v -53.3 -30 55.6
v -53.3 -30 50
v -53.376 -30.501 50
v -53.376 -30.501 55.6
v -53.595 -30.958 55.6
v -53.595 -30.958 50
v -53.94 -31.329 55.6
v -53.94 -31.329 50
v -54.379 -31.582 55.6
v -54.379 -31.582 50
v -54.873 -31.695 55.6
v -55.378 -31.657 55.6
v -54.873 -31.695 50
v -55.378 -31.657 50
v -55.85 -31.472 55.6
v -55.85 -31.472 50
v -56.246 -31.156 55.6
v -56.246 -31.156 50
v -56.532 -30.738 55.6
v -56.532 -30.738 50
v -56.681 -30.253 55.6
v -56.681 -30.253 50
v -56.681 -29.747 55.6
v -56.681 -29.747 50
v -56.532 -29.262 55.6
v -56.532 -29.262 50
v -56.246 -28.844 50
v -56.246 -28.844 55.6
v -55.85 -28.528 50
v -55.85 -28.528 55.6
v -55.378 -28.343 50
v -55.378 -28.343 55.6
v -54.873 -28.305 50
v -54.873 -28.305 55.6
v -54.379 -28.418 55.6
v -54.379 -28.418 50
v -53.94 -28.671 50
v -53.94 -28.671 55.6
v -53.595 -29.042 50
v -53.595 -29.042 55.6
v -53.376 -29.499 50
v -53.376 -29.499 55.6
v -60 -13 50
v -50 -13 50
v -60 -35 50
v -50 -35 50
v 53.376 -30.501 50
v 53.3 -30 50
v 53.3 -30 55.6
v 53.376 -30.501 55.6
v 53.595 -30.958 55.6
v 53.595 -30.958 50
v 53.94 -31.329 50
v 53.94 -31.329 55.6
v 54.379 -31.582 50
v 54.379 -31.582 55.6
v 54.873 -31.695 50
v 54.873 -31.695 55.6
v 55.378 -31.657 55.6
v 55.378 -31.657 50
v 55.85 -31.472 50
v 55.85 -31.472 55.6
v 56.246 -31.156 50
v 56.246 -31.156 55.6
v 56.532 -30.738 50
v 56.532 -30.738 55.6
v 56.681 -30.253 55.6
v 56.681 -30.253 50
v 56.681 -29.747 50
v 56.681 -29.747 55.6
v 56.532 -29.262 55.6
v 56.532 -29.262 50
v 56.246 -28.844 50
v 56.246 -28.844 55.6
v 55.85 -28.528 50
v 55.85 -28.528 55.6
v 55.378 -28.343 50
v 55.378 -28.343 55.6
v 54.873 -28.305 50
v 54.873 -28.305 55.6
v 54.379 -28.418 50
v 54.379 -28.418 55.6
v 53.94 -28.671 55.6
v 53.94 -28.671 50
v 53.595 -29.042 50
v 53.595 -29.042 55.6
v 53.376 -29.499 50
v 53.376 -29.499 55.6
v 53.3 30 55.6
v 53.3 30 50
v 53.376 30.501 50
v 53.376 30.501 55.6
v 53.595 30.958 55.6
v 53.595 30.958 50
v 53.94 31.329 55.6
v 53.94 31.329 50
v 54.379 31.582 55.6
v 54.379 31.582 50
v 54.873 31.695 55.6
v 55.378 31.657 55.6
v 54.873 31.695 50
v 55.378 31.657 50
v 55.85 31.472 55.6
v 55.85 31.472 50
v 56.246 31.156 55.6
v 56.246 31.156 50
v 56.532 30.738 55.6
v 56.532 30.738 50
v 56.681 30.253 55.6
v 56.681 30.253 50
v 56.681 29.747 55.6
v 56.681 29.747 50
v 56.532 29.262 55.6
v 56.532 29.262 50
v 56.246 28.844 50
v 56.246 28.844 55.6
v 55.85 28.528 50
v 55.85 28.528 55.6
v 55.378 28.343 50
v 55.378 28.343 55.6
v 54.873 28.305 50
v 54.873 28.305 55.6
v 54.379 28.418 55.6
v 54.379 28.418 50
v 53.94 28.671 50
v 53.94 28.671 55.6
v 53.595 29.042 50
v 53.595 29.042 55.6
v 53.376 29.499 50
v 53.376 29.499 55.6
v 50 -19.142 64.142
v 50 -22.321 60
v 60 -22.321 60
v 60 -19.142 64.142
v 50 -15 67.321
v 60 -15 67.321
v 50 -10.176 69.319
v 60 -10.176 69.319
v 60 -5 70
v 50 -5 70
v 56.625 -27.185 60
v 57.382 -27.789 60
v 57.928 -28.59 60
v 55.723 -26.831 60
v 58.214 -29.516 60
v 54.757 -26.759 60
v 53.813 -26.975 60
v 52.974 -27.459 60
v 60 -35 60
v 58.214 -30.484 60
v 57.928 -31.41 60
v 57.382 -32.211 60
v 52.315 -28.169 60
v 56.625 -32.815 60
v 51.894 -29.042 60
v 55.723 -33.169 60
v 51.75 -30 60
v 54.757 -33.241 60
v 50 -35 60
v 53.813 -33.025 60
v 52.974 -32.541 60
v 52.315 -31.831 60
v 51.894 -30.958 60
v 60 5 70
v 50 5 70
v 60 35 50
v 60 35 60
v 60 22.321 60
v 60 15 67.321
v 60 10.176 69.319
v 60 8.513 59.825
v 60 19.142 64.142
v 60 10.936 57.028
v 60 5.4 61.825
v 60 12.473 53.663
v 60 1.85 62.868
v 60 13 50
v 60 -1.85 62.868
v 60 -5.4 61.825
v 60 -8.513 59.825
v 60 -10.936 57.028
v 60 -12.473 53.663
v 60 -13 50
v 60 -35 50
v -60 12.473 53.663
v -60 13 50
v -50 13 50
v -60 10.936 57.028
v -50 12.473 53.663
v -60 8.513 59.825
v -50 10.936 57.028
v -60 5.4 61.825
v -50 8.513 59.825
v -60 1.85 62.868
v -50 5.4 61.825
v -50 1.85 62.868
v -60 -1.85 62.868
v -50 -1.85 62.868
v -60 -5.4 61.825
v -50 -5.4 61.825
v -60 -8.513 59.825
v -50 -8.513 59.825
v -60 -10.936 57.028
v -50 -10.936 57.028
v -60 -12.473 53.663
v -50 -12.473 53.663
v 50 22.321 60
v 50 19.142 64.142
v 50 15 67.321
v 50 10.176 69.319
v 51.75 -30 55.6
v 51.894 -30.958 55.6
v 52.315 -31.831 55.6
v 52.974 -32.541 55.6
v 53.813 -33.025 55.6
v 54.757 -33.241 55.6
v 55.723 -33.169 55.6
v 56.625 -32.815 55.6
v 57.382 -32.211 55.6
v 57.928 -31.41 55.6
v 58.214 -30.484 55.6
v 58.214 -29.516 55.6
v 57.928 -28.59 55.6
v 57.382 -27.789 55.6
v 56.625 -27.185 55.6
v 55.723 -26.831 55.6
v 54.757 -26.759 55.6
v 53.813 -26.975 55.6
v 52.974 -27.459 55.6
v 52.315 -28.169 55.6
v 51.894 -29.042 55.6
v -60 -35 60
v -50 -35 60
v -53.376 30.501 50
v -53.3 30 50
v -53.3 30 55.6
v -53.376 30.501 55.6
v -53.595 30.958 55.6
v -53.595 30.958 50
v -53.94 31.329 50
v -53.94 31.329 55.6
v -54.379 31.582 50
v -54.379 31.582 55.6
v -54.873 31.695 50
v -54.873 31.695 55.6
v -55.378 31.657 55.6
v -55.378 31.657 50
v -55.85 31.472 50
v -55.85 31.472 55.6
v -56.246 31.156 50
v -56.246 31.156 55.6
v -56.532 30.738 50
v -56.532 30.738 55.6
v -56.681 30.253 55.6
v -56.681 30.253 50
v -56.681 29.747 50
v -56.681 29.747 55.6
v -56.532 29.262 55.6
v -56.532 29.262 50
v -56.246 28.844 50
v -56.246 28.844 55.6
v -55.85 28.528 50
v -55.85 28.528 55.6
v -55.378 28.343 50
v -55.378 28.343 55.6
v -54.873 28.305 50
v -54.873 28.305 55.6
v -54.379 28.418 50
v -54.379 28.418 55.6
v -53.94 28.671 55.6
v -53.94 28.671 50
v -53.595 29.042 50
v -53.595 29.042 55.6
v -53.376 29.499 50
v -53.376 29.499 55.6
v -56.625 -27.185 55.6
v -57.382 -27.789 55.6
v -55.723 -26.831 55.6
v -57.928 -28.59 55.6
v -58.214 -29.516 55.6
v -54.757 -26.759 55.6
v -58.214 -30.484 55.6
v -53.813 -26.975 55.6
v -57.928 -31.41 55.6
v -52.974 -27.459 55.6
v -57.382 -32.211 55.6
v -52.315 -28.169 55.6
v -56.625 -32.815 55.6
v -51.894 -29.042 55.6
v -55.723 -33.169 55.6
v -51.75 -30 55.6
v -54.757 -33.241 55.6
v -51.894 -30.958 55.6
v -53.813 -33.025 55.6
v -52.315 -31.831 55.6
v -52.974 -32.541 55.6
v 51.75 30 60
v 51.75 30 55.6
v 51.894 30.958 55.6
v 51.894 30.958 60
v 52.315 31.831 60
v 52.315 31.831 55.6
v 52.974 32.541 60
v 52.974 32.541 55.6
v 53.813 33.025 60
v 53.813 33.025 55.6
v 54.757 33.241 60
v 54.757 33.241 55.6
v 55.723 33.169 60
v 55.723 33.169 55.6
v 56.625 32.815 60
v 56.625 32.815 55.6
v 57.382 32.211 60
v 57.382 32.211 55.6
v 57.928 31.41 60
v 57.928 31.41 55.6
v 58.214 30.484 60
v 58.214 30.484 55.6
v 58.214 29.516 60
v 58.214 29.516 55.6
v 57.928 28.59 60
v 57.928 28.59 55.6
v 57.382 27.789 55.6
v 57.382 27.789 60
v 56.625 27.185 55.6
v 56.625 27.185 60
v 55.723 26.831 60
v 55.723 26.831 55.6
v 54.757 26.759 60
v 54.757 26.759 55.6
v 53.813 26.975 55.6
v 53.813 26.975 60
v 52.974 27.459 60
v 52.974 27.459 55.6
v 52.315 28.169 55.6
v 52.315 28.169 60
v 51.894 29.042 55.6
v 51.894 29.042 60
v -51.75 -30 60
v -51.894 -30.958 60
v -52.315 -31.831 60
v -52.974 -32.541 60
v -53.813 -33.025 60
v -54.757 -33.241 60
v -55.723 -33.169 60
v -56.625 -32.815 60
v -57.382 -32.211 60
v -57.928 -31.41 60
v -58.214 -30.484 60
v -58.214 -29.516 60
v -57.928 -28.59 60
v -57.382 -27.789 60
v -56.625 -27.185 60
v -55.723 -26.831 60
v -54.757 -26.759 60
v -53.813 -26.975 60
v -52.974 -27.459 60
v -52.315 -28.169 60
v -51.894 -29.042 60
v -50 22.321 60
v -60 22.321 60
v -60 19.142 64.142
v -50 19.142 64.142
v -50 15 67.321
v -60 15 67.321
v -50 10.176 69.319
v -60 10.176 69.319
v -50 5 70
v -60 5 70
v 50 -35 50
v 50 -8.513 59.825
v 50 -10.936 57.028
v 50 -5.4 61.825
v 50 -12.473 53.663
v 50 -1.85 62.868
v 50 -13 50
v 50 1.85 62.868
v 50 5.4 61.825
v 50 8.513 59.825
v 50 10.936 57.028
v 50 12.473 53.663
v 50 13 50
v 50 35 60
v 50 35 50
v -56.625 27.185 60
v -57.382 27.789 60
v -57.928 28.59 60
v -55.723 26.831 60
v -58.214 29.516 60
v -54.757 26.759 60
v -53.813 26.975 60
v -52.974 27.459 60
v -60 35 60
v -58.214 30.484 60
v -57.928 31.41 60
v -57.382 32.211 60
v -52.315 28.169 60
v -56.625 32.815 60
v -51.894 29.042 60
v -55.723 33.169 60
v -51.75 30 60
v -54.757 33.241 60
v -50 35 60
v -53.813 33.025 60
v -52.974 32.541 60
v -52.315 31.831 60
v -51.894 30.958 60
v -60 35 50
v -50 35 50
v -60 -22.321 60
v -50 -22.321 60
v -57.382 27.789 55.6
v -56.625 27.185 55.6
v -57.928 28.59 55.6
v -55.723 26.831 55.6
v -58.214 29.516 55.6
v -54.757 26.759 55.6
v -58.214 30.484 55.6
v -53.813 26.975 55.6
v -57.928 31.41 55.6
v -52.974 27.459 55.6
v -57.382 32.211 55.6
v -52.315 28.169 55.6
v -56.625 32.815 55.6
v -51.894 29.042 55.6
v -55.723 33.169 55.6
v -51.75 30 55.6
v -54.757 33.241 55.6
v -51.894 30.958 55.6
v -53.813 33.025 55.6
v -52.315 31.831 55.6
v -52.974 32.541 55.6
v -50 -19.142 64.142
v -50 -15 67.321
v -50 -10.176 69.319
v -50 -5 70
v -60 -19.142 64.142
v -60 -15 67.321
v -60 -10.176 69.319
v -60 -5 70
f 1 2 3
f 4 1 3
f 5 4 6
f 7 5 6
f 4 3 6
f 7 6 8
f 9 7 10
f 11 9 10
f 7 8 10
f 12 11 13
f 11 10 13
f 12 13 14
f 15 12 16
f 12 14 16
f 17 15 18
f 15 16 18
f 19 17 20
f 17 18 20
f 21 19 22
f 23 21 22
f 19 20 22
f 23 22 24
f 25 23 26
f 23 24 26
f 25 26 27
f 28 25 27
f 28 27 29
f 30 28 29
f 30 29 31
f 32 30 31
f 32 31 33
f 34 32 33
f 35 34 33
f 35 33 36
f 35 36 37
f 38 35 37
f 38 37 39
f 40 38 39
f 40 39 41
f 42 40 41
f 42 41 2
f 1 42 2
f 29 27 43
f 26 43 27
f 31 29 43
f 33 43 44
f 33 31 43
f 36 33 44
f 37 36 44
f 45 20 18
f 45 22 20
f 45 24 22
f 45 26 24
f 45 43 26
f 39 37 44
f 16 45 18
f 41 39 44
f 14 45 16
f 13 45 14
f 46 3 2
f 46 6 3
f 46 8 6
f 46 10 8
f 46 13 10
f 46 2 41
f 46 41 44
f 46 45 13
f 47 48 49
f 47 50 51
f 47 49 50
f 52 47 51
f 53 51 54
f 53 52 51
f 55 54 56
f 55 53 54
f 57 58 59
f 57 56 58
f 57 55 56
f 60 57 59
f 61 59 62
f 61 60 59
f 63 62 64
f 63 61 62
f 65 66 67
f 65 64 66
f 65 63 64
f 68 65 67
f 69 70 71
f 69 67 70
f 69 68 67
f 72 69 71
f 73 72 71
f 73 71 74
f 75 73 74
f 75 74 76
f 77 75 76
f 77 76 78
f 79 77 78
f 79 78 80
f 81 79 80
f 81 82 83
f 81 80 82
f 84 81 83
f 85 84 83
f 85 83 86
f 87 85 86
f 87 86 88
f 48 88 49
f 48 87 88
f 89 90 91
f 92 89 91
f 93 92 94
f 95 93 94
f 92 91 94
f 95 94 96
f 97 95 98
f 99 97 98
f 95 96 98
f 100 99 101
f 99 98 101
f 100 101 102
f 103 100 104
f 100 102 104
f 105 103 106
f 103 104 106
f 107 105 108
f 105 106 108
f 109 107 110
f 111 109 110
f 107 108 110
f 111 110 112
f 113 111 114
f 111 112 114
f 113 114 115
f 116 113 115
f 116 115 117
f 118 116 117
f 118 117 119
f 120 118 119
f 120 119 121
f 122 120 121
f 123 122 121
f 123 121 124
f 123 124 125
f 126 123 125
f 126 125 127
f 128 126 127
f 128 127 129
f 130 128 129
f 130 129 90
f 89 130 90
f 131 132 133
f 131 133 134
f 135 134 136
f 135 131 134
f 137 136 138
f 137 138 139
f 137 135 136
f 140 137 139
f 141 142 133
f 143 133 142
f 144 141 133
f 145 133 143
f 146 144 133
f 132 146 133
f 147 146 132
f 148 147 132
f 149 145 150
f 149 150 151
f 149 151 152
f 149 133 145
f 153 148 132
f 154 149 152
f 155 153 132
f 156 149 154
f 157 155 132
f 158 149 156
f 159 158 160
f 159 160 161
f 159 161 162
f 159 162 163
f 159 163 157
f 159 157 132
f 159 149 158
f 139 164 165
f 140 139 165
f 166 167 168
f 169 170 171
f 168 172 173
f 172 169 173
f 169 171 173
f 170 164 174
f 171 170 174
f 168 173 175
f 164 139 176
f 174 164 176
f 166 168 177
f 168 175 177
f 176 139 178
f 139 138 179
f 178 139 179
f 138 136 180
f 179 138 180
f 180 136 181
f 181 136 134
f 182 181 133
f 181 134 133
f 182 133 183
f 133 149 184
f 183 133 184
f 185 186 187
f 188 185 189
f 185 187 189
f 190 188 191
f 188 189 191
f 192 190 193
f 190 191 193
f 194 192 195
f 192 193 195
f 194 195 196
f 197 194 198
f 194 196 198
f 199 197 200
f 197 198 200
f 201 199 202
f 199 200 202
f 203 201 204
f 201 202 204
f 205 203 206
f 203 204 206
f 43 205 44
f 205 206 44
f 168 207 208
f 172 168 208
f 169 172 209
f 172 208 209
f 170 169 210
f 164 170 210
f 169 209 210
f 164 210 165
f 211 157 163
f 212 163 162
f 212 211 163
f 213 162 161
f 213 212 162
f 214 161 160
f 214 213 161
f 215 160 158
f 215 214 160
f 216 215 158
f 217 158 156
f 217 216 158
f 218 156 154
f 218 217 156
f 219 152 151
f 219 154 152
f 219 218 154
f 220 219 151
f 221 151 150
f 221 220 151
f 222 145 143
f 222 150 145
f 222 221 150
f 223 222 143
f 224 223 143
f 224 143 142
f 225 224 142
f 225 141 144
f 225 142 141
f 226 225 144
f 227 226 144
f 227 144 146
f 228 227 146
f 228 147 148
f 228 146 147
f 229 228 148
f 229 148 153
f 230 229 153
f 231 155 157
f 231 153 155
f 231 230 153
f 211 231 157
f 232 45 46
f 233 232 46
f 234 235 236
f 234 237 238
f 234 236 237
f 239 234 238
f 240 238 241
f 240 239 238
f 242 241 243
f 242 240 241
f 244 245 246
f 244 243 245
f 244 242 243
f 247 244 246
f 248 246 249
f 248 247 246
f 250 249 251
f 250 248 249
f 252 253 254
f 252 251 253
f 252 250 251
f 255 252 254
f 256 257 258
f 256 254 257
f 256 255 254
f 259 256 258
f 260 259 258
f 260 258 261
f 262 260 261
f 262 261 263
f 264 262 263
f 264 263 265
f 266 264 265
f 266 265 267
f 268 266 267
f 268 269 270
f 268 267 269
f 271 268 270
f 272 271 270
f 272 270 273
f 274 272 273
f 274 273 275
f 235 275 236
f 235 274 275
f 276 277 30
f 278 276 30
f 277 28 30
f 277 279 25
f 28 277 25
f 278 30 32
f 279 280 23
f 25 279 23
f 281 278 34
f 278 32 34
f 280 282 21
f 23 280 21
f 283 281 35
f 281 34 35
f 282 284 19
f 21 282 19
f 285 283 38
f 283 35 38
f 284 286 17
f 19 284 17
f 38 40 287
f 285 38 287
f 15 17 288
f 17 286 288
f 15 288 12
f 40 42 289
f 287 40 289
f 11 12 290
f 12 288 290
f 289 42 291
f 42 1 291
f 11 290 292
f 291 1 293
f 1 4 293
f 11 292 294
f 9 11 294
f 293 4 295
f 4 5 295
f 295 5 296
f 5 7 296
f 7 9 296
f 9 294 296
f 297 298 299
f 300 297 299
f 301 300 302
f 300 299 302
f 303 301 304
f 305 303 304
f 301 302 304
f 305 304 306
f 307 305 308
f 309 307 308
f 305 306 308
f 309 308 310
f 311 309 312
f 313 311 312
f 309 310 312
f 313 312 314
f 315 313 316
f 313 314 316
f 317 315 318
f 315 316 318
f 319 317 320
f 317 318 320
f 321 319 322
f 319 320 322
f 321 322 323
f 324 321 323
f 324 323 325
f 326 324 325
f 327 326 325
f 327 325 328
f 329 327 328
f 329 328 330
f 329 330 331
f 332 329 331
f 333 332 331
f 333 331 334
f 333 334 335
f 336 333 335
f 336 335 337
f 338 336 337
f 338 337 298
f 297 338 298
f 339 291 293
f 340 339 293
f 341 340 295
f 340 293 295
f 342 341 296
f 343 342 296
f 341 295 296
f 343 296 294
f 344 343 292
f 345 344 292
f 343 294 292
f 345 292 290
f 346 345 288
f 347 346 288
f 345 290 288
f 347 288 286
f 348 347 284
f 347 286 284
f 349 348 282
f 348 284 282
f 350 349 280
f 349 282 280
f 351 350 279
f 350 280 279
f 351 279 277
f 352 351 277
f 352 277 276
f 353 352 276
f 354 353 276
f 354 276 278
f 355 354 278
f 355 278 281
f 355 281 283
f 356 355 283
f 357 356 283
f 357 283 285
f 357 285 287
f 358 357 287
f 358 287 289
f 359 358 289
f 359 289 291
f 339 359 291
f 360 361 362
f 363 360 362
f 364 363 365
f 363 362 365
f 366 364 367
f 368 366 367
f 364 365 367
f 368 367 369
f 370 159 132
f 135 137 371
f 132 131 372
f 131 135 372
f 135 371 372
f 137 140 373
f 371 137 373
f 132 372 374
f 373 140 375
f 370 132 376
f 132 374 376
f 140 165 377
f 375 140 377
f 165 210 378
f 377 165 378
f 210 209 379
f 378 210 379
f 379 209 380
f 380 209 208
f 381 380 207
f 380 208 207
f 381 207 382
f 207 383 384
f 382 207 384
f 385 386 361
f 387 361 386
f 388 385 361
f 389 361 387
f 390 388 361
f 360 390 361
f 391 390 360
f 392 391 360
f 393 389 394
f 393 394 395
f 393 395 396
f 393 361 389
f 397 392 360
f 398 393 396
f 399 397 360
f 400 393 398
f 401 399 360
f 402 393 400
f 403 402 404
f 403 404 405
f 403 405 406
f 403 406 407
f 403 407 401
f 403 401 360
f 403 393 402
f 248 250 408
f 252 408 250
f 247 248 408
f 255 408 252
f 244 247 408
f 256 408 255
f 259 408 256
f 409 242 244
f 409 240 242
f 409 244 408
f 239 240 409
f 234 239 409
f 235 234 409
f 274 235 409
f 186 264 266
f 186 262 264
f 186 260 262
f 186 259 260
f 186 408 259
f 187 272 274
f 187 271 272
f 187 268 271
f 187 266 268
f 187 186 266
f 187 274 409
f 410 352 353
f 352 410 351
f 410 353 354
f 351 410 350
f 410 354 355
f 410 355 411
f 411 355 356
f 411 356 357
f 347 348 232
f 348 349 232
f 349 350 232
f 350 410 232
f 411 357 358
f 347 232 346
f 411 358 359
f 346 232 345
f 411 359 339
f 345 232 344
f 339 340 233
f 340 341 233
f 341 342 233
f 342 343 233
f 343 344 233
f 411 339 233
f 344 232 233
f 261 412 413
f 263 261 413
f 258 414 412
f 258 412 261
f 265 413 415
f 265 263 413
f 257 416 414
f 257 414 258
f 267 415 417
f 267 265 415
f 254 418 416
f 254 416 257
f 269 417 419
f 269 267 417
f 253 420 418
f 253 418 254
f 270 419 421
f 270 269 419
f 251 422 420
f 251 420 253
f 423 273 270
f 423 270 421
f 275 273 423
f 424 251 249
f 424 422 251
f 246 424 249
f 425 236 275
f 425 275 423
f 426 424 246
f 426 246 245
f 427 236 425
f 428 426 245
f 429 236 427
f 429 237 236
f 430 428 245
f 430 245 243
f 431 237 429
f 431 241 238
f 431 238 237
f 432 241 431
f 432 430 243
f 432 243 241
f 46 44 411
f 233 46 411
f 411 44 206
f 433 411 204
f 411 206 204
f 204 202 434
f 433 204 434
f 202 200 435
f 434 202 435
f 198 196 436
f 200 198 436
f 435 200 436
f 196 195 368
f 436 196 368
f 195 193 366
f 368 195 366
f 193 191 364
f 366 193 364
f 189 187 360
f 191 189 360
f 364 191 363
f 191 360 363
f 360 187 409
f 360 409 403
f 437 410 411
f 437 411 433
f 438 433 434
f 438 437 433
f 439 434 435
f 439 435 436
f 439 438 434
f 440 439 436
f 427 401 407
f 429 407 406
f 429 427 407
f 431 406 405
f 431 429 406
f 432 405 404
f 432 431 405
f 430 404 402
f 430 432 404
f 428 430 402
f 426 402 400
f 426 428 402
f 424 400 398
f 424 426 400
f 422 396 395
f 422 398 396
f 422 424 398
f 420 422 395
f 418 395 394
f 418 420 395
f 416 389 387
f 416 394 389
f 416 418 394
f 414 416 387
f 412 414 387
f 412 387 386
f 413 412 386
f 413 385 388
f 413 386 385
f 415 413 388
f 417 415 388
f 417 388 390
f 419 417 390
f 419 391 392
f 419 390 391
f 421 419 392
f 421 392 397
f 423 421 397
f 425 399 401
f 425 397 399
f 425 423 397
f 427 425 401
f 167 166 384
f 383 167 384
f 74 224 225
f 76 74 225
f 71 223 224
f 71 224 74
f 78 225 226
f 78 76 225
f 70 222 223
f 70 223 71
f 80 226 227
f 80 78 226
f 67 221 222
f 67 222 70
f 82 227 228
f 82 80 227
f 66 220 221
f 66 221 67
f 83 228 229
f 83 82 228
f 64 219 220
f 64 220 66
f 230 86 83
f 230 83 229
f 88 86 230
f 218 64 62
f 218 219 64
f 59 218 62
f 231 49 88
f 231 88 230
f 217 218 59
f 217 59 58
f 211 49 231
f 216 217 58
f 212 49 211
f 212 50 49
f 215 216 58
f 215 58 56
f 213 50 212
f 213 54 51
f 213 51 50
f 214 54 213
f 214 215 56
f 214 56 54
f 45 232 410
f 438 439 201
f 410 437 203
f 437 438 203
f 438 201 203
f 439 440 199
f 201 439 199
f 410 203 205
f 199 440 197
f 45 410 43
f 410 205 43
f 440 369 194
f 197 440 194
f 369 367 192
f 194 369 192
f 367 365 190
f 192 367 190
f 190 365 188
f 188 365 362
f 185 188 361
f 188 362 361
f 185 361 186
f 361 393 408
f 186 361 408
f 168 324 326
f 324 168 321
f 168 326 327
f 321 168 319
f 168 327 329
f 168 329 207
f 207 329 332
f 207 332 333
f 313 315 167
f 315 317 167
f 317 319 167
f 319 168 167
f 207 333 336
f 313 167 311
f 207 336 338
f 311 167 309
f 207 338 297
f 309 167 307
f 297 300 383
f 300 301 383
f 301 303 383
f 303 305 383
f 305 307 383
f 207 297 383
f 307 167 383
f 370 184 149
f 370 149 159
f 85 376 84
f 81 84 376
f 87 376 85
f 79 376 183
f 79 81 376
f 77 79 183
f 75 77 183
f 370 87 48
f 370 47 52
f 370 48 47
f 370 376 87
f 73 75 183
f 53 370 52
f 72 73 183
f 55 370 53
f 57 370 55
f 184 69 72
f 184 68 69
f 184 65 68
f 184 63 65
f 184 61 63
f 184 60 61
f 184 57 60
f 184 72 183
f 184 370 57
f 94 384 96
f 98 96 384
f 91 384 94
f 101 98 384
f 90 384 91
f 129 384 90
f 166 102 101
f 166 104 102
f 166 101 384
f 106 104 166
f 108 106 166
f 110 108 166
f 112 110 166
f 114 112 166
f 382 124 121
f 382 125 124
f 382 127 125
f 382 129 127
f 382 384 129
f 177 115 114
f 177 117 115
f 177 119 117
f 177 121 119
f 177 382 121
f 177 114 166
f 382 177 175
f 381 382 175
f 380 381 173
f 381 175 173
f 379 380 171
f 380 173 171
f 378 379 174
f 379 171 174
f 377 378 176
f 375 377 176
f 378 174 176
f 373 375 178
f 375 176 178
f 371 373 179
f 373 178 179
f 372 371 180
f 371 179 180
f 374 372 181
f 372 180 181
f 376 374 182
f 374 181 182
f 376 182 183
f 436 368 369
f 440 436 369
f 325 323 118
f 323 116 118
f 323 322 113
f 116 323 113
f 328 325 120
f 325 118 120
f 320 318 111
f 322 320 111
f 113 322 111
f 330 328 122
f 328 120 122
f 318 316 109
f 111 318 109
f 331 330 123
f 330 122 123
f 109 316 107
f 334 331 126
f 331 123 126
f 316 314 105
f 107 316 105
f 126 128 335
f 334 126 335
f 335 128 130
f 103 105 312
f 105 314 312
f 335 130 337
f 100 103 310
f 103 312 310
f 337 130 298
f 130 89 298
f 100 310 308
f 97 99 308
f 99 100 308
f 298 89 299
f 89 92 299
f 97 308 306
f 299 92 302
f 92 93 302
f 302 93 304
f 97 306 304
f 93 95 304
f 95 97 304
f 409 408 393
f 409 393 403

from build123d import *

# Parameters (mm, degrees)
AUFSATZ_LINEAR_AUSTRAGEN1_DEPTH            = 25
SCHNITT_LINEAR_AUSTRAGEN1_DEPTH            = 20
FASE1_SIZE                                 = 10
VERRUNDUNG1_R                              = 20
SKIZZE3_R                                  = 3.25
SCHNITT_LINEAR_AUSTRAGEN2_DEPTH            = 3.4
SKIZZE4_R                                  = 1.7
SCHNITT_LINEAR_AUSTRAGEN3_DEPTH            = 6.6
KREISMUSTER1_COUNT                         = 3
SKIZZE5_R                                  = 13
SCHNITT_LINEAR_AUSTRAGEN4_DEPTH            = 142.155942135
SKIZZE7_W                                  = 10
SKIZZE7_H                                  = 20
AUFSATZ_LINEAR_AUSTRAGEN2_DEPTH            = 10
SKIZZE9_R                                  = 1.7
SCHNITT_LINEAR_AUSTRAGEN7_DEPTH            = 81.156097709
SCHNITT_LINEAR_START                       = -4.4
SKIZZE8_R                                  = 3.25
SCHNITT_LINEAR_AUSTRAGEN6_DEPTH            = 97.187798753
SPIEGELN1_AT_THE_SECOND_PLANE_COPY_1_SKE_W = 10
SPIEGELN1_AT_THE_SECOND_PLANE_COPY_1_SKE_H = 20
SPIEGELN1_AT_THE_SECOND_PLANE_COPY_1_DEPTH = 10
SPIEGELN1_AT_THE_SECOND_PLANE_COPY_2_SKE_R = 1.7
SPIEGELN1_AT_THE_SECOND_PLANE_COPY_2_DEPTH = 81.156097709
SPIEGELN1_START                            = -4.4
SPIEGELN1_AT_THE_SECOND_PLANE_COPY_3_SKE_R = 3.25
SPIEGELN1_AT_THE_SECOND_PLANE_COPY_3_DEPTH = 97.187798753
SCHNITT_LINEAR_AUSTRAGEN5_DEPTH            = 99.615414617
SCHNITT_LINEAR_AUSTRAGEN5_DEPTH_BACK       = 99.615414617
SKIZZE6_W                                  = 120
SKIZZE6_H                                  = 50


with BuildPart() as part:
    # Skizze1 → Aufsatz-Linear austragen1 (new, symmetric)
    with BuildSketch(Plane(origin=(0, 0, 0), x_dir=(1, 0, 0), z_dir=(0, 1, 0))):
        Polygon((-60, 0), (60, 0), (60, -70), (50, -70), (50, -10), (-50, -10), (-50, -70), (-60, -70), align=None)
    extrude(amount=AUFSATZ_LINEAR_AUSTRAGEN1_DEPTH, both=True)

    # Skizze2 → Schnitt-Linear austragen1 (cut)
    with BuildSketch(Plane(origin=(0, 0, 0), x_dir=(-1, 0, 0), z_dir=(0, 0, -1))):
        with BuildLine():
            Line((-1.532970972, 2.1), (1.532970972, 2.1))
            ThreePointArc((1.532970972, 2.1), (0, -2.6), (-1.532970972, 2.1))
        make_face()
    extrude(amount=-SCHNITT_LINEAR_AUSTRAGEN1_DEPTH, mode=Mode.SUBTRACT)

    # Fase1
    fase1_edges = [part.edges().sort_by_distance(p)[0] for p in [
        (-60, 0, 0),
        (60, 0, 0),
        (50, 0, 10),
        (-50, 0, 10),
    ]]
    chamfer(fase1_edges, length=FASE1_SIZE)

    # Verrundung1
    verrundung1_edges = [part.edges().sort_by_distance(p)[0] for p in [
        (-55, -25, 70),
        (55, 25, 70),
        (-55, 25, 70),
        (55, -25, 70),
    ]]
    fillet(verrundung1_edges, radius=VERRUNDUNG1_R)

    # Skizze3 → Schnitt-Linear austragen2 (cut)
    with BuildSketch(Plane.XY.offset(10)):
        with Locations((0, 12)):
            Circle(SKIZZE3_R)
    schnitt_linear_austragen2 = extrude(amount=-SCHNITT_LINEAR_AUSTRAGEN2_DEPTH, mode=Mode.SUBTRACT)

    # Skizze4 → Schnitt-Linear austragen3 (cut)
    with BuildSketch(Plane.XY.offset(6.6)):
        with Locations((0, 12)):
            Circle(SKIZZE4_R)
    schnitt_linear_austragen3 = extrude(amount=-SCHNITT_LINEAR_AUSTRAGEN3_DEPTH, mode=Mode.SUBTRACT)

    # Kreismuster1: Schnitt-Linear austragen2, Schnitt-Linear austragen3 ×3 about axis
    kreismuster1_axis = Axis((0, 0, 0), (0, 0, 1))
    add([schnitt_linear_austragen2.rotate(kreismuster1_axis, i * 360 / KREISMUSTER1_COUNT) for i in range(1, KREISMUSTER1_COUNT)], mode=Mode.SUBTRACT)
    add([schnitt_linear_austragen3.rotate(kreismuster1_axis, i * 360 / KREISMUSTER1_COUNT) for i in range(1, KREISMUSTER1_COUNT)], mode=Mode.SUBTRACT)

    # Skizze5 → Schnitt-Linear austragen4 (cut, through all)
    with BuildSketch(Plane(origin=(60, 0, 0), x_dir=(0, 0, -1), z_dir=(1, 0, 0))):
        with Locations((-50, 0)):
            Circle(SKIZZE5_R)
    extrude(amount=-SCHNITT_LINEAR_AUSTRAGEN4_DEPTH, mode=Mode.SUBTRACT)

    # Skizze7 → Aufsatz-Linear austragen2 (add, symmetric)
    with BuildSketch(Plane(origin=(0, 25, 0), x_dir=(1, 0, 0), z_dir=(0, 1, 0))):
        with Locations((-55, -50)):
            Rectangle(SKIZZE7_W, SKIZZE7_H)
    aufsatz_linear_austragen2 = extrude(amount=AUFSATZ_LINEAR_AUSTRAGEN2_DEPTH, both=True)

    # Skizze9 → Schnitt-Linear austragen7 (cut, through all)
    with BuildSketch(Plane.XY.offset(40)):
        with Locations((-55, 30)):
            Circle(SKIZZE9_R)
    schnitt_linear_austragen7 = extrude(amount=SCHNITT_LINEAR_AUSTRAGEN7_DEPTH, mode=Mode.SUBTRACT)

    # Skizze8 → Schnitt-Linear austragen6 (cut)
    with BuildSketch(Plane.XY.offset(60).offset(SCHNITT_LINEAR_START)):
        with Locations((-55, 30)):
            Circle(SKIZZE8_R)
    schnitt_linear_austragen6 = extrude(amount=SCHNITT_LINEAR_AUSTRAGEN6_DEPTH, mode=Mode.SUBTRACT)

    # Spiegeln1: Aufsatz-Linear austragen2, Schnitt-Linear austragen7, Schnitt-Linear austragen6 across plane
    add(aufsatz_linear_austragen2.mirror(Plane(origin=(0, 0, 0), x_dir=(0, 0, 1), z_dir=(1, 0, 0))))
    add(schnitt_linear_austragen7.mirror(Plane(origin=(0, 0, 0), x_dir=(0, 0, 1), z_dir=(1, 0, 0))), mode=Mode.SUBTRACT)
    add(schnitt_linear_austragen6.mirror(Plane(origin=(0, 0, 0), x_dir=(0, 0, 1), z_dir=(1, 0, 0))), mode=Mode.SUBTRACT)

    # Spiegeln1 at the second plane: Aufsatz-Linear austragen2, Schnitt-Linear austragen7, Schnitt-Linear austragen6 across plane
    add(aufsatz_linear_austragen2.mirror(Plane.ZX))
    add(schnitt_linear_austragen7.mirror(Plane.ZX), mode=Mode.SUBTRACT)
    add(schnitt_linear_austragen6.mirror(Plane.ZX), mode=Mode.SUBTRACT)

    # Spiegeln1 at the second plane copy 1 ske → Spiegeln1 at the second plane copy 1 (add, symmetric)
    with BuildSketch(Plane(origin=(0, -25, 0), x_dir=(-1, 0, 0), z_dir=(0, -1, 0))):
        with Locations((-55, -50)):
            Rectangle(SPIEGELN1_AT_THE_SECOND_PLANE_COPY_1_SKE_W, SPIEGELN1_AT_THE_SECOND_PLANE_COPY_1_SKE_H)
    extrude(amount=SPIEGELN1_AT_THE_SECOND_PLANE_COPY_1_DEPTH, both=True)

    # Spiegeln1 at the second plane copy 2 ske → Spiegeln1 at the second plane copy 2 (cut, through all)
    with BuildSketch(Plane(origin=(0, 0, 40), x_dir=(-1, 0, 0), z_dir=(0, 0, 1))):
        with Locations((-55, 30)):
            Circle(SPIEGELN1_AT_THE_SECOND_PLANE_COPY_2_SKE_R)
    extrude(amount=SPIEGELN1_AT_THE_SECOND_PLANE_COPY_2_DEPTH, mode=Mode.SUBTRACT)

    # Spiegeln1 at the second plane copy 3 ske → Spiegeln1 at the second plane copy 3 (cut)
    with BuildSketch(Plane(origin=(0, 0, 60), x_dir=(-1, 0, 0), z_dir=(0, 0, 1)).offset(SPIEGELN1_START)):
        with Locations((-55, 30)):
            Circle(SPIEGELN1_AT_THE_SECOND_PLANE_COPY_3_SKE_R)
    extrude(amount=SPIEGELN1_AT_THE_SECOND_PLANE_COPY_3_DEPTH, mode=Mode.SUBTRACT)

    # Skizze6 → Schnitt-Linear austragen5 (cut, two sides: drawn at the far end of the back side and taken through both)
    with BuildSketch(Plane(origin=(0, 0, 0), x_dir=(1, 0, 0), z_dir=(0, 1, 0)).offset(-SCHNITT_LINEAR_AUSTRAGEN5_DEPTH_BACK)):
        with Locations((0, -25)):
            Rectangle(SKIZZE6_W, SKIZZE6_H)
    extrude(amount=SCHNITT_LINEAR_AUSTRAGEN5_DEPTH + SCHNITT_LINEAR_AUSTRAGEN5_DEPTH_BACK, mode=Mode.SUBTRACT)


with BuildPart() as schnitt_linear_austragen5_piece_1:
    # of the separate pieces the step leaves, piece 1, a body of its own (schnitt_linear_austragen5_pieces)
    add(part.part.solids().sort_by_distance((-50, 35, 50))[0])


with BuildPart() as schnitt_linear_austragen5_piece_2:
    # of the separate pieces the step leaves, piece 2, a body of its own (schnitt_linear_austragen5_pieces)
    add(part.part.solids().sort_by_distance((50, -22.320508076, 60))[0])


solid = Compound([schnitt_linear_austragen5_piece_1.part, schnitt_linear_austragen5_piece_2.part])
